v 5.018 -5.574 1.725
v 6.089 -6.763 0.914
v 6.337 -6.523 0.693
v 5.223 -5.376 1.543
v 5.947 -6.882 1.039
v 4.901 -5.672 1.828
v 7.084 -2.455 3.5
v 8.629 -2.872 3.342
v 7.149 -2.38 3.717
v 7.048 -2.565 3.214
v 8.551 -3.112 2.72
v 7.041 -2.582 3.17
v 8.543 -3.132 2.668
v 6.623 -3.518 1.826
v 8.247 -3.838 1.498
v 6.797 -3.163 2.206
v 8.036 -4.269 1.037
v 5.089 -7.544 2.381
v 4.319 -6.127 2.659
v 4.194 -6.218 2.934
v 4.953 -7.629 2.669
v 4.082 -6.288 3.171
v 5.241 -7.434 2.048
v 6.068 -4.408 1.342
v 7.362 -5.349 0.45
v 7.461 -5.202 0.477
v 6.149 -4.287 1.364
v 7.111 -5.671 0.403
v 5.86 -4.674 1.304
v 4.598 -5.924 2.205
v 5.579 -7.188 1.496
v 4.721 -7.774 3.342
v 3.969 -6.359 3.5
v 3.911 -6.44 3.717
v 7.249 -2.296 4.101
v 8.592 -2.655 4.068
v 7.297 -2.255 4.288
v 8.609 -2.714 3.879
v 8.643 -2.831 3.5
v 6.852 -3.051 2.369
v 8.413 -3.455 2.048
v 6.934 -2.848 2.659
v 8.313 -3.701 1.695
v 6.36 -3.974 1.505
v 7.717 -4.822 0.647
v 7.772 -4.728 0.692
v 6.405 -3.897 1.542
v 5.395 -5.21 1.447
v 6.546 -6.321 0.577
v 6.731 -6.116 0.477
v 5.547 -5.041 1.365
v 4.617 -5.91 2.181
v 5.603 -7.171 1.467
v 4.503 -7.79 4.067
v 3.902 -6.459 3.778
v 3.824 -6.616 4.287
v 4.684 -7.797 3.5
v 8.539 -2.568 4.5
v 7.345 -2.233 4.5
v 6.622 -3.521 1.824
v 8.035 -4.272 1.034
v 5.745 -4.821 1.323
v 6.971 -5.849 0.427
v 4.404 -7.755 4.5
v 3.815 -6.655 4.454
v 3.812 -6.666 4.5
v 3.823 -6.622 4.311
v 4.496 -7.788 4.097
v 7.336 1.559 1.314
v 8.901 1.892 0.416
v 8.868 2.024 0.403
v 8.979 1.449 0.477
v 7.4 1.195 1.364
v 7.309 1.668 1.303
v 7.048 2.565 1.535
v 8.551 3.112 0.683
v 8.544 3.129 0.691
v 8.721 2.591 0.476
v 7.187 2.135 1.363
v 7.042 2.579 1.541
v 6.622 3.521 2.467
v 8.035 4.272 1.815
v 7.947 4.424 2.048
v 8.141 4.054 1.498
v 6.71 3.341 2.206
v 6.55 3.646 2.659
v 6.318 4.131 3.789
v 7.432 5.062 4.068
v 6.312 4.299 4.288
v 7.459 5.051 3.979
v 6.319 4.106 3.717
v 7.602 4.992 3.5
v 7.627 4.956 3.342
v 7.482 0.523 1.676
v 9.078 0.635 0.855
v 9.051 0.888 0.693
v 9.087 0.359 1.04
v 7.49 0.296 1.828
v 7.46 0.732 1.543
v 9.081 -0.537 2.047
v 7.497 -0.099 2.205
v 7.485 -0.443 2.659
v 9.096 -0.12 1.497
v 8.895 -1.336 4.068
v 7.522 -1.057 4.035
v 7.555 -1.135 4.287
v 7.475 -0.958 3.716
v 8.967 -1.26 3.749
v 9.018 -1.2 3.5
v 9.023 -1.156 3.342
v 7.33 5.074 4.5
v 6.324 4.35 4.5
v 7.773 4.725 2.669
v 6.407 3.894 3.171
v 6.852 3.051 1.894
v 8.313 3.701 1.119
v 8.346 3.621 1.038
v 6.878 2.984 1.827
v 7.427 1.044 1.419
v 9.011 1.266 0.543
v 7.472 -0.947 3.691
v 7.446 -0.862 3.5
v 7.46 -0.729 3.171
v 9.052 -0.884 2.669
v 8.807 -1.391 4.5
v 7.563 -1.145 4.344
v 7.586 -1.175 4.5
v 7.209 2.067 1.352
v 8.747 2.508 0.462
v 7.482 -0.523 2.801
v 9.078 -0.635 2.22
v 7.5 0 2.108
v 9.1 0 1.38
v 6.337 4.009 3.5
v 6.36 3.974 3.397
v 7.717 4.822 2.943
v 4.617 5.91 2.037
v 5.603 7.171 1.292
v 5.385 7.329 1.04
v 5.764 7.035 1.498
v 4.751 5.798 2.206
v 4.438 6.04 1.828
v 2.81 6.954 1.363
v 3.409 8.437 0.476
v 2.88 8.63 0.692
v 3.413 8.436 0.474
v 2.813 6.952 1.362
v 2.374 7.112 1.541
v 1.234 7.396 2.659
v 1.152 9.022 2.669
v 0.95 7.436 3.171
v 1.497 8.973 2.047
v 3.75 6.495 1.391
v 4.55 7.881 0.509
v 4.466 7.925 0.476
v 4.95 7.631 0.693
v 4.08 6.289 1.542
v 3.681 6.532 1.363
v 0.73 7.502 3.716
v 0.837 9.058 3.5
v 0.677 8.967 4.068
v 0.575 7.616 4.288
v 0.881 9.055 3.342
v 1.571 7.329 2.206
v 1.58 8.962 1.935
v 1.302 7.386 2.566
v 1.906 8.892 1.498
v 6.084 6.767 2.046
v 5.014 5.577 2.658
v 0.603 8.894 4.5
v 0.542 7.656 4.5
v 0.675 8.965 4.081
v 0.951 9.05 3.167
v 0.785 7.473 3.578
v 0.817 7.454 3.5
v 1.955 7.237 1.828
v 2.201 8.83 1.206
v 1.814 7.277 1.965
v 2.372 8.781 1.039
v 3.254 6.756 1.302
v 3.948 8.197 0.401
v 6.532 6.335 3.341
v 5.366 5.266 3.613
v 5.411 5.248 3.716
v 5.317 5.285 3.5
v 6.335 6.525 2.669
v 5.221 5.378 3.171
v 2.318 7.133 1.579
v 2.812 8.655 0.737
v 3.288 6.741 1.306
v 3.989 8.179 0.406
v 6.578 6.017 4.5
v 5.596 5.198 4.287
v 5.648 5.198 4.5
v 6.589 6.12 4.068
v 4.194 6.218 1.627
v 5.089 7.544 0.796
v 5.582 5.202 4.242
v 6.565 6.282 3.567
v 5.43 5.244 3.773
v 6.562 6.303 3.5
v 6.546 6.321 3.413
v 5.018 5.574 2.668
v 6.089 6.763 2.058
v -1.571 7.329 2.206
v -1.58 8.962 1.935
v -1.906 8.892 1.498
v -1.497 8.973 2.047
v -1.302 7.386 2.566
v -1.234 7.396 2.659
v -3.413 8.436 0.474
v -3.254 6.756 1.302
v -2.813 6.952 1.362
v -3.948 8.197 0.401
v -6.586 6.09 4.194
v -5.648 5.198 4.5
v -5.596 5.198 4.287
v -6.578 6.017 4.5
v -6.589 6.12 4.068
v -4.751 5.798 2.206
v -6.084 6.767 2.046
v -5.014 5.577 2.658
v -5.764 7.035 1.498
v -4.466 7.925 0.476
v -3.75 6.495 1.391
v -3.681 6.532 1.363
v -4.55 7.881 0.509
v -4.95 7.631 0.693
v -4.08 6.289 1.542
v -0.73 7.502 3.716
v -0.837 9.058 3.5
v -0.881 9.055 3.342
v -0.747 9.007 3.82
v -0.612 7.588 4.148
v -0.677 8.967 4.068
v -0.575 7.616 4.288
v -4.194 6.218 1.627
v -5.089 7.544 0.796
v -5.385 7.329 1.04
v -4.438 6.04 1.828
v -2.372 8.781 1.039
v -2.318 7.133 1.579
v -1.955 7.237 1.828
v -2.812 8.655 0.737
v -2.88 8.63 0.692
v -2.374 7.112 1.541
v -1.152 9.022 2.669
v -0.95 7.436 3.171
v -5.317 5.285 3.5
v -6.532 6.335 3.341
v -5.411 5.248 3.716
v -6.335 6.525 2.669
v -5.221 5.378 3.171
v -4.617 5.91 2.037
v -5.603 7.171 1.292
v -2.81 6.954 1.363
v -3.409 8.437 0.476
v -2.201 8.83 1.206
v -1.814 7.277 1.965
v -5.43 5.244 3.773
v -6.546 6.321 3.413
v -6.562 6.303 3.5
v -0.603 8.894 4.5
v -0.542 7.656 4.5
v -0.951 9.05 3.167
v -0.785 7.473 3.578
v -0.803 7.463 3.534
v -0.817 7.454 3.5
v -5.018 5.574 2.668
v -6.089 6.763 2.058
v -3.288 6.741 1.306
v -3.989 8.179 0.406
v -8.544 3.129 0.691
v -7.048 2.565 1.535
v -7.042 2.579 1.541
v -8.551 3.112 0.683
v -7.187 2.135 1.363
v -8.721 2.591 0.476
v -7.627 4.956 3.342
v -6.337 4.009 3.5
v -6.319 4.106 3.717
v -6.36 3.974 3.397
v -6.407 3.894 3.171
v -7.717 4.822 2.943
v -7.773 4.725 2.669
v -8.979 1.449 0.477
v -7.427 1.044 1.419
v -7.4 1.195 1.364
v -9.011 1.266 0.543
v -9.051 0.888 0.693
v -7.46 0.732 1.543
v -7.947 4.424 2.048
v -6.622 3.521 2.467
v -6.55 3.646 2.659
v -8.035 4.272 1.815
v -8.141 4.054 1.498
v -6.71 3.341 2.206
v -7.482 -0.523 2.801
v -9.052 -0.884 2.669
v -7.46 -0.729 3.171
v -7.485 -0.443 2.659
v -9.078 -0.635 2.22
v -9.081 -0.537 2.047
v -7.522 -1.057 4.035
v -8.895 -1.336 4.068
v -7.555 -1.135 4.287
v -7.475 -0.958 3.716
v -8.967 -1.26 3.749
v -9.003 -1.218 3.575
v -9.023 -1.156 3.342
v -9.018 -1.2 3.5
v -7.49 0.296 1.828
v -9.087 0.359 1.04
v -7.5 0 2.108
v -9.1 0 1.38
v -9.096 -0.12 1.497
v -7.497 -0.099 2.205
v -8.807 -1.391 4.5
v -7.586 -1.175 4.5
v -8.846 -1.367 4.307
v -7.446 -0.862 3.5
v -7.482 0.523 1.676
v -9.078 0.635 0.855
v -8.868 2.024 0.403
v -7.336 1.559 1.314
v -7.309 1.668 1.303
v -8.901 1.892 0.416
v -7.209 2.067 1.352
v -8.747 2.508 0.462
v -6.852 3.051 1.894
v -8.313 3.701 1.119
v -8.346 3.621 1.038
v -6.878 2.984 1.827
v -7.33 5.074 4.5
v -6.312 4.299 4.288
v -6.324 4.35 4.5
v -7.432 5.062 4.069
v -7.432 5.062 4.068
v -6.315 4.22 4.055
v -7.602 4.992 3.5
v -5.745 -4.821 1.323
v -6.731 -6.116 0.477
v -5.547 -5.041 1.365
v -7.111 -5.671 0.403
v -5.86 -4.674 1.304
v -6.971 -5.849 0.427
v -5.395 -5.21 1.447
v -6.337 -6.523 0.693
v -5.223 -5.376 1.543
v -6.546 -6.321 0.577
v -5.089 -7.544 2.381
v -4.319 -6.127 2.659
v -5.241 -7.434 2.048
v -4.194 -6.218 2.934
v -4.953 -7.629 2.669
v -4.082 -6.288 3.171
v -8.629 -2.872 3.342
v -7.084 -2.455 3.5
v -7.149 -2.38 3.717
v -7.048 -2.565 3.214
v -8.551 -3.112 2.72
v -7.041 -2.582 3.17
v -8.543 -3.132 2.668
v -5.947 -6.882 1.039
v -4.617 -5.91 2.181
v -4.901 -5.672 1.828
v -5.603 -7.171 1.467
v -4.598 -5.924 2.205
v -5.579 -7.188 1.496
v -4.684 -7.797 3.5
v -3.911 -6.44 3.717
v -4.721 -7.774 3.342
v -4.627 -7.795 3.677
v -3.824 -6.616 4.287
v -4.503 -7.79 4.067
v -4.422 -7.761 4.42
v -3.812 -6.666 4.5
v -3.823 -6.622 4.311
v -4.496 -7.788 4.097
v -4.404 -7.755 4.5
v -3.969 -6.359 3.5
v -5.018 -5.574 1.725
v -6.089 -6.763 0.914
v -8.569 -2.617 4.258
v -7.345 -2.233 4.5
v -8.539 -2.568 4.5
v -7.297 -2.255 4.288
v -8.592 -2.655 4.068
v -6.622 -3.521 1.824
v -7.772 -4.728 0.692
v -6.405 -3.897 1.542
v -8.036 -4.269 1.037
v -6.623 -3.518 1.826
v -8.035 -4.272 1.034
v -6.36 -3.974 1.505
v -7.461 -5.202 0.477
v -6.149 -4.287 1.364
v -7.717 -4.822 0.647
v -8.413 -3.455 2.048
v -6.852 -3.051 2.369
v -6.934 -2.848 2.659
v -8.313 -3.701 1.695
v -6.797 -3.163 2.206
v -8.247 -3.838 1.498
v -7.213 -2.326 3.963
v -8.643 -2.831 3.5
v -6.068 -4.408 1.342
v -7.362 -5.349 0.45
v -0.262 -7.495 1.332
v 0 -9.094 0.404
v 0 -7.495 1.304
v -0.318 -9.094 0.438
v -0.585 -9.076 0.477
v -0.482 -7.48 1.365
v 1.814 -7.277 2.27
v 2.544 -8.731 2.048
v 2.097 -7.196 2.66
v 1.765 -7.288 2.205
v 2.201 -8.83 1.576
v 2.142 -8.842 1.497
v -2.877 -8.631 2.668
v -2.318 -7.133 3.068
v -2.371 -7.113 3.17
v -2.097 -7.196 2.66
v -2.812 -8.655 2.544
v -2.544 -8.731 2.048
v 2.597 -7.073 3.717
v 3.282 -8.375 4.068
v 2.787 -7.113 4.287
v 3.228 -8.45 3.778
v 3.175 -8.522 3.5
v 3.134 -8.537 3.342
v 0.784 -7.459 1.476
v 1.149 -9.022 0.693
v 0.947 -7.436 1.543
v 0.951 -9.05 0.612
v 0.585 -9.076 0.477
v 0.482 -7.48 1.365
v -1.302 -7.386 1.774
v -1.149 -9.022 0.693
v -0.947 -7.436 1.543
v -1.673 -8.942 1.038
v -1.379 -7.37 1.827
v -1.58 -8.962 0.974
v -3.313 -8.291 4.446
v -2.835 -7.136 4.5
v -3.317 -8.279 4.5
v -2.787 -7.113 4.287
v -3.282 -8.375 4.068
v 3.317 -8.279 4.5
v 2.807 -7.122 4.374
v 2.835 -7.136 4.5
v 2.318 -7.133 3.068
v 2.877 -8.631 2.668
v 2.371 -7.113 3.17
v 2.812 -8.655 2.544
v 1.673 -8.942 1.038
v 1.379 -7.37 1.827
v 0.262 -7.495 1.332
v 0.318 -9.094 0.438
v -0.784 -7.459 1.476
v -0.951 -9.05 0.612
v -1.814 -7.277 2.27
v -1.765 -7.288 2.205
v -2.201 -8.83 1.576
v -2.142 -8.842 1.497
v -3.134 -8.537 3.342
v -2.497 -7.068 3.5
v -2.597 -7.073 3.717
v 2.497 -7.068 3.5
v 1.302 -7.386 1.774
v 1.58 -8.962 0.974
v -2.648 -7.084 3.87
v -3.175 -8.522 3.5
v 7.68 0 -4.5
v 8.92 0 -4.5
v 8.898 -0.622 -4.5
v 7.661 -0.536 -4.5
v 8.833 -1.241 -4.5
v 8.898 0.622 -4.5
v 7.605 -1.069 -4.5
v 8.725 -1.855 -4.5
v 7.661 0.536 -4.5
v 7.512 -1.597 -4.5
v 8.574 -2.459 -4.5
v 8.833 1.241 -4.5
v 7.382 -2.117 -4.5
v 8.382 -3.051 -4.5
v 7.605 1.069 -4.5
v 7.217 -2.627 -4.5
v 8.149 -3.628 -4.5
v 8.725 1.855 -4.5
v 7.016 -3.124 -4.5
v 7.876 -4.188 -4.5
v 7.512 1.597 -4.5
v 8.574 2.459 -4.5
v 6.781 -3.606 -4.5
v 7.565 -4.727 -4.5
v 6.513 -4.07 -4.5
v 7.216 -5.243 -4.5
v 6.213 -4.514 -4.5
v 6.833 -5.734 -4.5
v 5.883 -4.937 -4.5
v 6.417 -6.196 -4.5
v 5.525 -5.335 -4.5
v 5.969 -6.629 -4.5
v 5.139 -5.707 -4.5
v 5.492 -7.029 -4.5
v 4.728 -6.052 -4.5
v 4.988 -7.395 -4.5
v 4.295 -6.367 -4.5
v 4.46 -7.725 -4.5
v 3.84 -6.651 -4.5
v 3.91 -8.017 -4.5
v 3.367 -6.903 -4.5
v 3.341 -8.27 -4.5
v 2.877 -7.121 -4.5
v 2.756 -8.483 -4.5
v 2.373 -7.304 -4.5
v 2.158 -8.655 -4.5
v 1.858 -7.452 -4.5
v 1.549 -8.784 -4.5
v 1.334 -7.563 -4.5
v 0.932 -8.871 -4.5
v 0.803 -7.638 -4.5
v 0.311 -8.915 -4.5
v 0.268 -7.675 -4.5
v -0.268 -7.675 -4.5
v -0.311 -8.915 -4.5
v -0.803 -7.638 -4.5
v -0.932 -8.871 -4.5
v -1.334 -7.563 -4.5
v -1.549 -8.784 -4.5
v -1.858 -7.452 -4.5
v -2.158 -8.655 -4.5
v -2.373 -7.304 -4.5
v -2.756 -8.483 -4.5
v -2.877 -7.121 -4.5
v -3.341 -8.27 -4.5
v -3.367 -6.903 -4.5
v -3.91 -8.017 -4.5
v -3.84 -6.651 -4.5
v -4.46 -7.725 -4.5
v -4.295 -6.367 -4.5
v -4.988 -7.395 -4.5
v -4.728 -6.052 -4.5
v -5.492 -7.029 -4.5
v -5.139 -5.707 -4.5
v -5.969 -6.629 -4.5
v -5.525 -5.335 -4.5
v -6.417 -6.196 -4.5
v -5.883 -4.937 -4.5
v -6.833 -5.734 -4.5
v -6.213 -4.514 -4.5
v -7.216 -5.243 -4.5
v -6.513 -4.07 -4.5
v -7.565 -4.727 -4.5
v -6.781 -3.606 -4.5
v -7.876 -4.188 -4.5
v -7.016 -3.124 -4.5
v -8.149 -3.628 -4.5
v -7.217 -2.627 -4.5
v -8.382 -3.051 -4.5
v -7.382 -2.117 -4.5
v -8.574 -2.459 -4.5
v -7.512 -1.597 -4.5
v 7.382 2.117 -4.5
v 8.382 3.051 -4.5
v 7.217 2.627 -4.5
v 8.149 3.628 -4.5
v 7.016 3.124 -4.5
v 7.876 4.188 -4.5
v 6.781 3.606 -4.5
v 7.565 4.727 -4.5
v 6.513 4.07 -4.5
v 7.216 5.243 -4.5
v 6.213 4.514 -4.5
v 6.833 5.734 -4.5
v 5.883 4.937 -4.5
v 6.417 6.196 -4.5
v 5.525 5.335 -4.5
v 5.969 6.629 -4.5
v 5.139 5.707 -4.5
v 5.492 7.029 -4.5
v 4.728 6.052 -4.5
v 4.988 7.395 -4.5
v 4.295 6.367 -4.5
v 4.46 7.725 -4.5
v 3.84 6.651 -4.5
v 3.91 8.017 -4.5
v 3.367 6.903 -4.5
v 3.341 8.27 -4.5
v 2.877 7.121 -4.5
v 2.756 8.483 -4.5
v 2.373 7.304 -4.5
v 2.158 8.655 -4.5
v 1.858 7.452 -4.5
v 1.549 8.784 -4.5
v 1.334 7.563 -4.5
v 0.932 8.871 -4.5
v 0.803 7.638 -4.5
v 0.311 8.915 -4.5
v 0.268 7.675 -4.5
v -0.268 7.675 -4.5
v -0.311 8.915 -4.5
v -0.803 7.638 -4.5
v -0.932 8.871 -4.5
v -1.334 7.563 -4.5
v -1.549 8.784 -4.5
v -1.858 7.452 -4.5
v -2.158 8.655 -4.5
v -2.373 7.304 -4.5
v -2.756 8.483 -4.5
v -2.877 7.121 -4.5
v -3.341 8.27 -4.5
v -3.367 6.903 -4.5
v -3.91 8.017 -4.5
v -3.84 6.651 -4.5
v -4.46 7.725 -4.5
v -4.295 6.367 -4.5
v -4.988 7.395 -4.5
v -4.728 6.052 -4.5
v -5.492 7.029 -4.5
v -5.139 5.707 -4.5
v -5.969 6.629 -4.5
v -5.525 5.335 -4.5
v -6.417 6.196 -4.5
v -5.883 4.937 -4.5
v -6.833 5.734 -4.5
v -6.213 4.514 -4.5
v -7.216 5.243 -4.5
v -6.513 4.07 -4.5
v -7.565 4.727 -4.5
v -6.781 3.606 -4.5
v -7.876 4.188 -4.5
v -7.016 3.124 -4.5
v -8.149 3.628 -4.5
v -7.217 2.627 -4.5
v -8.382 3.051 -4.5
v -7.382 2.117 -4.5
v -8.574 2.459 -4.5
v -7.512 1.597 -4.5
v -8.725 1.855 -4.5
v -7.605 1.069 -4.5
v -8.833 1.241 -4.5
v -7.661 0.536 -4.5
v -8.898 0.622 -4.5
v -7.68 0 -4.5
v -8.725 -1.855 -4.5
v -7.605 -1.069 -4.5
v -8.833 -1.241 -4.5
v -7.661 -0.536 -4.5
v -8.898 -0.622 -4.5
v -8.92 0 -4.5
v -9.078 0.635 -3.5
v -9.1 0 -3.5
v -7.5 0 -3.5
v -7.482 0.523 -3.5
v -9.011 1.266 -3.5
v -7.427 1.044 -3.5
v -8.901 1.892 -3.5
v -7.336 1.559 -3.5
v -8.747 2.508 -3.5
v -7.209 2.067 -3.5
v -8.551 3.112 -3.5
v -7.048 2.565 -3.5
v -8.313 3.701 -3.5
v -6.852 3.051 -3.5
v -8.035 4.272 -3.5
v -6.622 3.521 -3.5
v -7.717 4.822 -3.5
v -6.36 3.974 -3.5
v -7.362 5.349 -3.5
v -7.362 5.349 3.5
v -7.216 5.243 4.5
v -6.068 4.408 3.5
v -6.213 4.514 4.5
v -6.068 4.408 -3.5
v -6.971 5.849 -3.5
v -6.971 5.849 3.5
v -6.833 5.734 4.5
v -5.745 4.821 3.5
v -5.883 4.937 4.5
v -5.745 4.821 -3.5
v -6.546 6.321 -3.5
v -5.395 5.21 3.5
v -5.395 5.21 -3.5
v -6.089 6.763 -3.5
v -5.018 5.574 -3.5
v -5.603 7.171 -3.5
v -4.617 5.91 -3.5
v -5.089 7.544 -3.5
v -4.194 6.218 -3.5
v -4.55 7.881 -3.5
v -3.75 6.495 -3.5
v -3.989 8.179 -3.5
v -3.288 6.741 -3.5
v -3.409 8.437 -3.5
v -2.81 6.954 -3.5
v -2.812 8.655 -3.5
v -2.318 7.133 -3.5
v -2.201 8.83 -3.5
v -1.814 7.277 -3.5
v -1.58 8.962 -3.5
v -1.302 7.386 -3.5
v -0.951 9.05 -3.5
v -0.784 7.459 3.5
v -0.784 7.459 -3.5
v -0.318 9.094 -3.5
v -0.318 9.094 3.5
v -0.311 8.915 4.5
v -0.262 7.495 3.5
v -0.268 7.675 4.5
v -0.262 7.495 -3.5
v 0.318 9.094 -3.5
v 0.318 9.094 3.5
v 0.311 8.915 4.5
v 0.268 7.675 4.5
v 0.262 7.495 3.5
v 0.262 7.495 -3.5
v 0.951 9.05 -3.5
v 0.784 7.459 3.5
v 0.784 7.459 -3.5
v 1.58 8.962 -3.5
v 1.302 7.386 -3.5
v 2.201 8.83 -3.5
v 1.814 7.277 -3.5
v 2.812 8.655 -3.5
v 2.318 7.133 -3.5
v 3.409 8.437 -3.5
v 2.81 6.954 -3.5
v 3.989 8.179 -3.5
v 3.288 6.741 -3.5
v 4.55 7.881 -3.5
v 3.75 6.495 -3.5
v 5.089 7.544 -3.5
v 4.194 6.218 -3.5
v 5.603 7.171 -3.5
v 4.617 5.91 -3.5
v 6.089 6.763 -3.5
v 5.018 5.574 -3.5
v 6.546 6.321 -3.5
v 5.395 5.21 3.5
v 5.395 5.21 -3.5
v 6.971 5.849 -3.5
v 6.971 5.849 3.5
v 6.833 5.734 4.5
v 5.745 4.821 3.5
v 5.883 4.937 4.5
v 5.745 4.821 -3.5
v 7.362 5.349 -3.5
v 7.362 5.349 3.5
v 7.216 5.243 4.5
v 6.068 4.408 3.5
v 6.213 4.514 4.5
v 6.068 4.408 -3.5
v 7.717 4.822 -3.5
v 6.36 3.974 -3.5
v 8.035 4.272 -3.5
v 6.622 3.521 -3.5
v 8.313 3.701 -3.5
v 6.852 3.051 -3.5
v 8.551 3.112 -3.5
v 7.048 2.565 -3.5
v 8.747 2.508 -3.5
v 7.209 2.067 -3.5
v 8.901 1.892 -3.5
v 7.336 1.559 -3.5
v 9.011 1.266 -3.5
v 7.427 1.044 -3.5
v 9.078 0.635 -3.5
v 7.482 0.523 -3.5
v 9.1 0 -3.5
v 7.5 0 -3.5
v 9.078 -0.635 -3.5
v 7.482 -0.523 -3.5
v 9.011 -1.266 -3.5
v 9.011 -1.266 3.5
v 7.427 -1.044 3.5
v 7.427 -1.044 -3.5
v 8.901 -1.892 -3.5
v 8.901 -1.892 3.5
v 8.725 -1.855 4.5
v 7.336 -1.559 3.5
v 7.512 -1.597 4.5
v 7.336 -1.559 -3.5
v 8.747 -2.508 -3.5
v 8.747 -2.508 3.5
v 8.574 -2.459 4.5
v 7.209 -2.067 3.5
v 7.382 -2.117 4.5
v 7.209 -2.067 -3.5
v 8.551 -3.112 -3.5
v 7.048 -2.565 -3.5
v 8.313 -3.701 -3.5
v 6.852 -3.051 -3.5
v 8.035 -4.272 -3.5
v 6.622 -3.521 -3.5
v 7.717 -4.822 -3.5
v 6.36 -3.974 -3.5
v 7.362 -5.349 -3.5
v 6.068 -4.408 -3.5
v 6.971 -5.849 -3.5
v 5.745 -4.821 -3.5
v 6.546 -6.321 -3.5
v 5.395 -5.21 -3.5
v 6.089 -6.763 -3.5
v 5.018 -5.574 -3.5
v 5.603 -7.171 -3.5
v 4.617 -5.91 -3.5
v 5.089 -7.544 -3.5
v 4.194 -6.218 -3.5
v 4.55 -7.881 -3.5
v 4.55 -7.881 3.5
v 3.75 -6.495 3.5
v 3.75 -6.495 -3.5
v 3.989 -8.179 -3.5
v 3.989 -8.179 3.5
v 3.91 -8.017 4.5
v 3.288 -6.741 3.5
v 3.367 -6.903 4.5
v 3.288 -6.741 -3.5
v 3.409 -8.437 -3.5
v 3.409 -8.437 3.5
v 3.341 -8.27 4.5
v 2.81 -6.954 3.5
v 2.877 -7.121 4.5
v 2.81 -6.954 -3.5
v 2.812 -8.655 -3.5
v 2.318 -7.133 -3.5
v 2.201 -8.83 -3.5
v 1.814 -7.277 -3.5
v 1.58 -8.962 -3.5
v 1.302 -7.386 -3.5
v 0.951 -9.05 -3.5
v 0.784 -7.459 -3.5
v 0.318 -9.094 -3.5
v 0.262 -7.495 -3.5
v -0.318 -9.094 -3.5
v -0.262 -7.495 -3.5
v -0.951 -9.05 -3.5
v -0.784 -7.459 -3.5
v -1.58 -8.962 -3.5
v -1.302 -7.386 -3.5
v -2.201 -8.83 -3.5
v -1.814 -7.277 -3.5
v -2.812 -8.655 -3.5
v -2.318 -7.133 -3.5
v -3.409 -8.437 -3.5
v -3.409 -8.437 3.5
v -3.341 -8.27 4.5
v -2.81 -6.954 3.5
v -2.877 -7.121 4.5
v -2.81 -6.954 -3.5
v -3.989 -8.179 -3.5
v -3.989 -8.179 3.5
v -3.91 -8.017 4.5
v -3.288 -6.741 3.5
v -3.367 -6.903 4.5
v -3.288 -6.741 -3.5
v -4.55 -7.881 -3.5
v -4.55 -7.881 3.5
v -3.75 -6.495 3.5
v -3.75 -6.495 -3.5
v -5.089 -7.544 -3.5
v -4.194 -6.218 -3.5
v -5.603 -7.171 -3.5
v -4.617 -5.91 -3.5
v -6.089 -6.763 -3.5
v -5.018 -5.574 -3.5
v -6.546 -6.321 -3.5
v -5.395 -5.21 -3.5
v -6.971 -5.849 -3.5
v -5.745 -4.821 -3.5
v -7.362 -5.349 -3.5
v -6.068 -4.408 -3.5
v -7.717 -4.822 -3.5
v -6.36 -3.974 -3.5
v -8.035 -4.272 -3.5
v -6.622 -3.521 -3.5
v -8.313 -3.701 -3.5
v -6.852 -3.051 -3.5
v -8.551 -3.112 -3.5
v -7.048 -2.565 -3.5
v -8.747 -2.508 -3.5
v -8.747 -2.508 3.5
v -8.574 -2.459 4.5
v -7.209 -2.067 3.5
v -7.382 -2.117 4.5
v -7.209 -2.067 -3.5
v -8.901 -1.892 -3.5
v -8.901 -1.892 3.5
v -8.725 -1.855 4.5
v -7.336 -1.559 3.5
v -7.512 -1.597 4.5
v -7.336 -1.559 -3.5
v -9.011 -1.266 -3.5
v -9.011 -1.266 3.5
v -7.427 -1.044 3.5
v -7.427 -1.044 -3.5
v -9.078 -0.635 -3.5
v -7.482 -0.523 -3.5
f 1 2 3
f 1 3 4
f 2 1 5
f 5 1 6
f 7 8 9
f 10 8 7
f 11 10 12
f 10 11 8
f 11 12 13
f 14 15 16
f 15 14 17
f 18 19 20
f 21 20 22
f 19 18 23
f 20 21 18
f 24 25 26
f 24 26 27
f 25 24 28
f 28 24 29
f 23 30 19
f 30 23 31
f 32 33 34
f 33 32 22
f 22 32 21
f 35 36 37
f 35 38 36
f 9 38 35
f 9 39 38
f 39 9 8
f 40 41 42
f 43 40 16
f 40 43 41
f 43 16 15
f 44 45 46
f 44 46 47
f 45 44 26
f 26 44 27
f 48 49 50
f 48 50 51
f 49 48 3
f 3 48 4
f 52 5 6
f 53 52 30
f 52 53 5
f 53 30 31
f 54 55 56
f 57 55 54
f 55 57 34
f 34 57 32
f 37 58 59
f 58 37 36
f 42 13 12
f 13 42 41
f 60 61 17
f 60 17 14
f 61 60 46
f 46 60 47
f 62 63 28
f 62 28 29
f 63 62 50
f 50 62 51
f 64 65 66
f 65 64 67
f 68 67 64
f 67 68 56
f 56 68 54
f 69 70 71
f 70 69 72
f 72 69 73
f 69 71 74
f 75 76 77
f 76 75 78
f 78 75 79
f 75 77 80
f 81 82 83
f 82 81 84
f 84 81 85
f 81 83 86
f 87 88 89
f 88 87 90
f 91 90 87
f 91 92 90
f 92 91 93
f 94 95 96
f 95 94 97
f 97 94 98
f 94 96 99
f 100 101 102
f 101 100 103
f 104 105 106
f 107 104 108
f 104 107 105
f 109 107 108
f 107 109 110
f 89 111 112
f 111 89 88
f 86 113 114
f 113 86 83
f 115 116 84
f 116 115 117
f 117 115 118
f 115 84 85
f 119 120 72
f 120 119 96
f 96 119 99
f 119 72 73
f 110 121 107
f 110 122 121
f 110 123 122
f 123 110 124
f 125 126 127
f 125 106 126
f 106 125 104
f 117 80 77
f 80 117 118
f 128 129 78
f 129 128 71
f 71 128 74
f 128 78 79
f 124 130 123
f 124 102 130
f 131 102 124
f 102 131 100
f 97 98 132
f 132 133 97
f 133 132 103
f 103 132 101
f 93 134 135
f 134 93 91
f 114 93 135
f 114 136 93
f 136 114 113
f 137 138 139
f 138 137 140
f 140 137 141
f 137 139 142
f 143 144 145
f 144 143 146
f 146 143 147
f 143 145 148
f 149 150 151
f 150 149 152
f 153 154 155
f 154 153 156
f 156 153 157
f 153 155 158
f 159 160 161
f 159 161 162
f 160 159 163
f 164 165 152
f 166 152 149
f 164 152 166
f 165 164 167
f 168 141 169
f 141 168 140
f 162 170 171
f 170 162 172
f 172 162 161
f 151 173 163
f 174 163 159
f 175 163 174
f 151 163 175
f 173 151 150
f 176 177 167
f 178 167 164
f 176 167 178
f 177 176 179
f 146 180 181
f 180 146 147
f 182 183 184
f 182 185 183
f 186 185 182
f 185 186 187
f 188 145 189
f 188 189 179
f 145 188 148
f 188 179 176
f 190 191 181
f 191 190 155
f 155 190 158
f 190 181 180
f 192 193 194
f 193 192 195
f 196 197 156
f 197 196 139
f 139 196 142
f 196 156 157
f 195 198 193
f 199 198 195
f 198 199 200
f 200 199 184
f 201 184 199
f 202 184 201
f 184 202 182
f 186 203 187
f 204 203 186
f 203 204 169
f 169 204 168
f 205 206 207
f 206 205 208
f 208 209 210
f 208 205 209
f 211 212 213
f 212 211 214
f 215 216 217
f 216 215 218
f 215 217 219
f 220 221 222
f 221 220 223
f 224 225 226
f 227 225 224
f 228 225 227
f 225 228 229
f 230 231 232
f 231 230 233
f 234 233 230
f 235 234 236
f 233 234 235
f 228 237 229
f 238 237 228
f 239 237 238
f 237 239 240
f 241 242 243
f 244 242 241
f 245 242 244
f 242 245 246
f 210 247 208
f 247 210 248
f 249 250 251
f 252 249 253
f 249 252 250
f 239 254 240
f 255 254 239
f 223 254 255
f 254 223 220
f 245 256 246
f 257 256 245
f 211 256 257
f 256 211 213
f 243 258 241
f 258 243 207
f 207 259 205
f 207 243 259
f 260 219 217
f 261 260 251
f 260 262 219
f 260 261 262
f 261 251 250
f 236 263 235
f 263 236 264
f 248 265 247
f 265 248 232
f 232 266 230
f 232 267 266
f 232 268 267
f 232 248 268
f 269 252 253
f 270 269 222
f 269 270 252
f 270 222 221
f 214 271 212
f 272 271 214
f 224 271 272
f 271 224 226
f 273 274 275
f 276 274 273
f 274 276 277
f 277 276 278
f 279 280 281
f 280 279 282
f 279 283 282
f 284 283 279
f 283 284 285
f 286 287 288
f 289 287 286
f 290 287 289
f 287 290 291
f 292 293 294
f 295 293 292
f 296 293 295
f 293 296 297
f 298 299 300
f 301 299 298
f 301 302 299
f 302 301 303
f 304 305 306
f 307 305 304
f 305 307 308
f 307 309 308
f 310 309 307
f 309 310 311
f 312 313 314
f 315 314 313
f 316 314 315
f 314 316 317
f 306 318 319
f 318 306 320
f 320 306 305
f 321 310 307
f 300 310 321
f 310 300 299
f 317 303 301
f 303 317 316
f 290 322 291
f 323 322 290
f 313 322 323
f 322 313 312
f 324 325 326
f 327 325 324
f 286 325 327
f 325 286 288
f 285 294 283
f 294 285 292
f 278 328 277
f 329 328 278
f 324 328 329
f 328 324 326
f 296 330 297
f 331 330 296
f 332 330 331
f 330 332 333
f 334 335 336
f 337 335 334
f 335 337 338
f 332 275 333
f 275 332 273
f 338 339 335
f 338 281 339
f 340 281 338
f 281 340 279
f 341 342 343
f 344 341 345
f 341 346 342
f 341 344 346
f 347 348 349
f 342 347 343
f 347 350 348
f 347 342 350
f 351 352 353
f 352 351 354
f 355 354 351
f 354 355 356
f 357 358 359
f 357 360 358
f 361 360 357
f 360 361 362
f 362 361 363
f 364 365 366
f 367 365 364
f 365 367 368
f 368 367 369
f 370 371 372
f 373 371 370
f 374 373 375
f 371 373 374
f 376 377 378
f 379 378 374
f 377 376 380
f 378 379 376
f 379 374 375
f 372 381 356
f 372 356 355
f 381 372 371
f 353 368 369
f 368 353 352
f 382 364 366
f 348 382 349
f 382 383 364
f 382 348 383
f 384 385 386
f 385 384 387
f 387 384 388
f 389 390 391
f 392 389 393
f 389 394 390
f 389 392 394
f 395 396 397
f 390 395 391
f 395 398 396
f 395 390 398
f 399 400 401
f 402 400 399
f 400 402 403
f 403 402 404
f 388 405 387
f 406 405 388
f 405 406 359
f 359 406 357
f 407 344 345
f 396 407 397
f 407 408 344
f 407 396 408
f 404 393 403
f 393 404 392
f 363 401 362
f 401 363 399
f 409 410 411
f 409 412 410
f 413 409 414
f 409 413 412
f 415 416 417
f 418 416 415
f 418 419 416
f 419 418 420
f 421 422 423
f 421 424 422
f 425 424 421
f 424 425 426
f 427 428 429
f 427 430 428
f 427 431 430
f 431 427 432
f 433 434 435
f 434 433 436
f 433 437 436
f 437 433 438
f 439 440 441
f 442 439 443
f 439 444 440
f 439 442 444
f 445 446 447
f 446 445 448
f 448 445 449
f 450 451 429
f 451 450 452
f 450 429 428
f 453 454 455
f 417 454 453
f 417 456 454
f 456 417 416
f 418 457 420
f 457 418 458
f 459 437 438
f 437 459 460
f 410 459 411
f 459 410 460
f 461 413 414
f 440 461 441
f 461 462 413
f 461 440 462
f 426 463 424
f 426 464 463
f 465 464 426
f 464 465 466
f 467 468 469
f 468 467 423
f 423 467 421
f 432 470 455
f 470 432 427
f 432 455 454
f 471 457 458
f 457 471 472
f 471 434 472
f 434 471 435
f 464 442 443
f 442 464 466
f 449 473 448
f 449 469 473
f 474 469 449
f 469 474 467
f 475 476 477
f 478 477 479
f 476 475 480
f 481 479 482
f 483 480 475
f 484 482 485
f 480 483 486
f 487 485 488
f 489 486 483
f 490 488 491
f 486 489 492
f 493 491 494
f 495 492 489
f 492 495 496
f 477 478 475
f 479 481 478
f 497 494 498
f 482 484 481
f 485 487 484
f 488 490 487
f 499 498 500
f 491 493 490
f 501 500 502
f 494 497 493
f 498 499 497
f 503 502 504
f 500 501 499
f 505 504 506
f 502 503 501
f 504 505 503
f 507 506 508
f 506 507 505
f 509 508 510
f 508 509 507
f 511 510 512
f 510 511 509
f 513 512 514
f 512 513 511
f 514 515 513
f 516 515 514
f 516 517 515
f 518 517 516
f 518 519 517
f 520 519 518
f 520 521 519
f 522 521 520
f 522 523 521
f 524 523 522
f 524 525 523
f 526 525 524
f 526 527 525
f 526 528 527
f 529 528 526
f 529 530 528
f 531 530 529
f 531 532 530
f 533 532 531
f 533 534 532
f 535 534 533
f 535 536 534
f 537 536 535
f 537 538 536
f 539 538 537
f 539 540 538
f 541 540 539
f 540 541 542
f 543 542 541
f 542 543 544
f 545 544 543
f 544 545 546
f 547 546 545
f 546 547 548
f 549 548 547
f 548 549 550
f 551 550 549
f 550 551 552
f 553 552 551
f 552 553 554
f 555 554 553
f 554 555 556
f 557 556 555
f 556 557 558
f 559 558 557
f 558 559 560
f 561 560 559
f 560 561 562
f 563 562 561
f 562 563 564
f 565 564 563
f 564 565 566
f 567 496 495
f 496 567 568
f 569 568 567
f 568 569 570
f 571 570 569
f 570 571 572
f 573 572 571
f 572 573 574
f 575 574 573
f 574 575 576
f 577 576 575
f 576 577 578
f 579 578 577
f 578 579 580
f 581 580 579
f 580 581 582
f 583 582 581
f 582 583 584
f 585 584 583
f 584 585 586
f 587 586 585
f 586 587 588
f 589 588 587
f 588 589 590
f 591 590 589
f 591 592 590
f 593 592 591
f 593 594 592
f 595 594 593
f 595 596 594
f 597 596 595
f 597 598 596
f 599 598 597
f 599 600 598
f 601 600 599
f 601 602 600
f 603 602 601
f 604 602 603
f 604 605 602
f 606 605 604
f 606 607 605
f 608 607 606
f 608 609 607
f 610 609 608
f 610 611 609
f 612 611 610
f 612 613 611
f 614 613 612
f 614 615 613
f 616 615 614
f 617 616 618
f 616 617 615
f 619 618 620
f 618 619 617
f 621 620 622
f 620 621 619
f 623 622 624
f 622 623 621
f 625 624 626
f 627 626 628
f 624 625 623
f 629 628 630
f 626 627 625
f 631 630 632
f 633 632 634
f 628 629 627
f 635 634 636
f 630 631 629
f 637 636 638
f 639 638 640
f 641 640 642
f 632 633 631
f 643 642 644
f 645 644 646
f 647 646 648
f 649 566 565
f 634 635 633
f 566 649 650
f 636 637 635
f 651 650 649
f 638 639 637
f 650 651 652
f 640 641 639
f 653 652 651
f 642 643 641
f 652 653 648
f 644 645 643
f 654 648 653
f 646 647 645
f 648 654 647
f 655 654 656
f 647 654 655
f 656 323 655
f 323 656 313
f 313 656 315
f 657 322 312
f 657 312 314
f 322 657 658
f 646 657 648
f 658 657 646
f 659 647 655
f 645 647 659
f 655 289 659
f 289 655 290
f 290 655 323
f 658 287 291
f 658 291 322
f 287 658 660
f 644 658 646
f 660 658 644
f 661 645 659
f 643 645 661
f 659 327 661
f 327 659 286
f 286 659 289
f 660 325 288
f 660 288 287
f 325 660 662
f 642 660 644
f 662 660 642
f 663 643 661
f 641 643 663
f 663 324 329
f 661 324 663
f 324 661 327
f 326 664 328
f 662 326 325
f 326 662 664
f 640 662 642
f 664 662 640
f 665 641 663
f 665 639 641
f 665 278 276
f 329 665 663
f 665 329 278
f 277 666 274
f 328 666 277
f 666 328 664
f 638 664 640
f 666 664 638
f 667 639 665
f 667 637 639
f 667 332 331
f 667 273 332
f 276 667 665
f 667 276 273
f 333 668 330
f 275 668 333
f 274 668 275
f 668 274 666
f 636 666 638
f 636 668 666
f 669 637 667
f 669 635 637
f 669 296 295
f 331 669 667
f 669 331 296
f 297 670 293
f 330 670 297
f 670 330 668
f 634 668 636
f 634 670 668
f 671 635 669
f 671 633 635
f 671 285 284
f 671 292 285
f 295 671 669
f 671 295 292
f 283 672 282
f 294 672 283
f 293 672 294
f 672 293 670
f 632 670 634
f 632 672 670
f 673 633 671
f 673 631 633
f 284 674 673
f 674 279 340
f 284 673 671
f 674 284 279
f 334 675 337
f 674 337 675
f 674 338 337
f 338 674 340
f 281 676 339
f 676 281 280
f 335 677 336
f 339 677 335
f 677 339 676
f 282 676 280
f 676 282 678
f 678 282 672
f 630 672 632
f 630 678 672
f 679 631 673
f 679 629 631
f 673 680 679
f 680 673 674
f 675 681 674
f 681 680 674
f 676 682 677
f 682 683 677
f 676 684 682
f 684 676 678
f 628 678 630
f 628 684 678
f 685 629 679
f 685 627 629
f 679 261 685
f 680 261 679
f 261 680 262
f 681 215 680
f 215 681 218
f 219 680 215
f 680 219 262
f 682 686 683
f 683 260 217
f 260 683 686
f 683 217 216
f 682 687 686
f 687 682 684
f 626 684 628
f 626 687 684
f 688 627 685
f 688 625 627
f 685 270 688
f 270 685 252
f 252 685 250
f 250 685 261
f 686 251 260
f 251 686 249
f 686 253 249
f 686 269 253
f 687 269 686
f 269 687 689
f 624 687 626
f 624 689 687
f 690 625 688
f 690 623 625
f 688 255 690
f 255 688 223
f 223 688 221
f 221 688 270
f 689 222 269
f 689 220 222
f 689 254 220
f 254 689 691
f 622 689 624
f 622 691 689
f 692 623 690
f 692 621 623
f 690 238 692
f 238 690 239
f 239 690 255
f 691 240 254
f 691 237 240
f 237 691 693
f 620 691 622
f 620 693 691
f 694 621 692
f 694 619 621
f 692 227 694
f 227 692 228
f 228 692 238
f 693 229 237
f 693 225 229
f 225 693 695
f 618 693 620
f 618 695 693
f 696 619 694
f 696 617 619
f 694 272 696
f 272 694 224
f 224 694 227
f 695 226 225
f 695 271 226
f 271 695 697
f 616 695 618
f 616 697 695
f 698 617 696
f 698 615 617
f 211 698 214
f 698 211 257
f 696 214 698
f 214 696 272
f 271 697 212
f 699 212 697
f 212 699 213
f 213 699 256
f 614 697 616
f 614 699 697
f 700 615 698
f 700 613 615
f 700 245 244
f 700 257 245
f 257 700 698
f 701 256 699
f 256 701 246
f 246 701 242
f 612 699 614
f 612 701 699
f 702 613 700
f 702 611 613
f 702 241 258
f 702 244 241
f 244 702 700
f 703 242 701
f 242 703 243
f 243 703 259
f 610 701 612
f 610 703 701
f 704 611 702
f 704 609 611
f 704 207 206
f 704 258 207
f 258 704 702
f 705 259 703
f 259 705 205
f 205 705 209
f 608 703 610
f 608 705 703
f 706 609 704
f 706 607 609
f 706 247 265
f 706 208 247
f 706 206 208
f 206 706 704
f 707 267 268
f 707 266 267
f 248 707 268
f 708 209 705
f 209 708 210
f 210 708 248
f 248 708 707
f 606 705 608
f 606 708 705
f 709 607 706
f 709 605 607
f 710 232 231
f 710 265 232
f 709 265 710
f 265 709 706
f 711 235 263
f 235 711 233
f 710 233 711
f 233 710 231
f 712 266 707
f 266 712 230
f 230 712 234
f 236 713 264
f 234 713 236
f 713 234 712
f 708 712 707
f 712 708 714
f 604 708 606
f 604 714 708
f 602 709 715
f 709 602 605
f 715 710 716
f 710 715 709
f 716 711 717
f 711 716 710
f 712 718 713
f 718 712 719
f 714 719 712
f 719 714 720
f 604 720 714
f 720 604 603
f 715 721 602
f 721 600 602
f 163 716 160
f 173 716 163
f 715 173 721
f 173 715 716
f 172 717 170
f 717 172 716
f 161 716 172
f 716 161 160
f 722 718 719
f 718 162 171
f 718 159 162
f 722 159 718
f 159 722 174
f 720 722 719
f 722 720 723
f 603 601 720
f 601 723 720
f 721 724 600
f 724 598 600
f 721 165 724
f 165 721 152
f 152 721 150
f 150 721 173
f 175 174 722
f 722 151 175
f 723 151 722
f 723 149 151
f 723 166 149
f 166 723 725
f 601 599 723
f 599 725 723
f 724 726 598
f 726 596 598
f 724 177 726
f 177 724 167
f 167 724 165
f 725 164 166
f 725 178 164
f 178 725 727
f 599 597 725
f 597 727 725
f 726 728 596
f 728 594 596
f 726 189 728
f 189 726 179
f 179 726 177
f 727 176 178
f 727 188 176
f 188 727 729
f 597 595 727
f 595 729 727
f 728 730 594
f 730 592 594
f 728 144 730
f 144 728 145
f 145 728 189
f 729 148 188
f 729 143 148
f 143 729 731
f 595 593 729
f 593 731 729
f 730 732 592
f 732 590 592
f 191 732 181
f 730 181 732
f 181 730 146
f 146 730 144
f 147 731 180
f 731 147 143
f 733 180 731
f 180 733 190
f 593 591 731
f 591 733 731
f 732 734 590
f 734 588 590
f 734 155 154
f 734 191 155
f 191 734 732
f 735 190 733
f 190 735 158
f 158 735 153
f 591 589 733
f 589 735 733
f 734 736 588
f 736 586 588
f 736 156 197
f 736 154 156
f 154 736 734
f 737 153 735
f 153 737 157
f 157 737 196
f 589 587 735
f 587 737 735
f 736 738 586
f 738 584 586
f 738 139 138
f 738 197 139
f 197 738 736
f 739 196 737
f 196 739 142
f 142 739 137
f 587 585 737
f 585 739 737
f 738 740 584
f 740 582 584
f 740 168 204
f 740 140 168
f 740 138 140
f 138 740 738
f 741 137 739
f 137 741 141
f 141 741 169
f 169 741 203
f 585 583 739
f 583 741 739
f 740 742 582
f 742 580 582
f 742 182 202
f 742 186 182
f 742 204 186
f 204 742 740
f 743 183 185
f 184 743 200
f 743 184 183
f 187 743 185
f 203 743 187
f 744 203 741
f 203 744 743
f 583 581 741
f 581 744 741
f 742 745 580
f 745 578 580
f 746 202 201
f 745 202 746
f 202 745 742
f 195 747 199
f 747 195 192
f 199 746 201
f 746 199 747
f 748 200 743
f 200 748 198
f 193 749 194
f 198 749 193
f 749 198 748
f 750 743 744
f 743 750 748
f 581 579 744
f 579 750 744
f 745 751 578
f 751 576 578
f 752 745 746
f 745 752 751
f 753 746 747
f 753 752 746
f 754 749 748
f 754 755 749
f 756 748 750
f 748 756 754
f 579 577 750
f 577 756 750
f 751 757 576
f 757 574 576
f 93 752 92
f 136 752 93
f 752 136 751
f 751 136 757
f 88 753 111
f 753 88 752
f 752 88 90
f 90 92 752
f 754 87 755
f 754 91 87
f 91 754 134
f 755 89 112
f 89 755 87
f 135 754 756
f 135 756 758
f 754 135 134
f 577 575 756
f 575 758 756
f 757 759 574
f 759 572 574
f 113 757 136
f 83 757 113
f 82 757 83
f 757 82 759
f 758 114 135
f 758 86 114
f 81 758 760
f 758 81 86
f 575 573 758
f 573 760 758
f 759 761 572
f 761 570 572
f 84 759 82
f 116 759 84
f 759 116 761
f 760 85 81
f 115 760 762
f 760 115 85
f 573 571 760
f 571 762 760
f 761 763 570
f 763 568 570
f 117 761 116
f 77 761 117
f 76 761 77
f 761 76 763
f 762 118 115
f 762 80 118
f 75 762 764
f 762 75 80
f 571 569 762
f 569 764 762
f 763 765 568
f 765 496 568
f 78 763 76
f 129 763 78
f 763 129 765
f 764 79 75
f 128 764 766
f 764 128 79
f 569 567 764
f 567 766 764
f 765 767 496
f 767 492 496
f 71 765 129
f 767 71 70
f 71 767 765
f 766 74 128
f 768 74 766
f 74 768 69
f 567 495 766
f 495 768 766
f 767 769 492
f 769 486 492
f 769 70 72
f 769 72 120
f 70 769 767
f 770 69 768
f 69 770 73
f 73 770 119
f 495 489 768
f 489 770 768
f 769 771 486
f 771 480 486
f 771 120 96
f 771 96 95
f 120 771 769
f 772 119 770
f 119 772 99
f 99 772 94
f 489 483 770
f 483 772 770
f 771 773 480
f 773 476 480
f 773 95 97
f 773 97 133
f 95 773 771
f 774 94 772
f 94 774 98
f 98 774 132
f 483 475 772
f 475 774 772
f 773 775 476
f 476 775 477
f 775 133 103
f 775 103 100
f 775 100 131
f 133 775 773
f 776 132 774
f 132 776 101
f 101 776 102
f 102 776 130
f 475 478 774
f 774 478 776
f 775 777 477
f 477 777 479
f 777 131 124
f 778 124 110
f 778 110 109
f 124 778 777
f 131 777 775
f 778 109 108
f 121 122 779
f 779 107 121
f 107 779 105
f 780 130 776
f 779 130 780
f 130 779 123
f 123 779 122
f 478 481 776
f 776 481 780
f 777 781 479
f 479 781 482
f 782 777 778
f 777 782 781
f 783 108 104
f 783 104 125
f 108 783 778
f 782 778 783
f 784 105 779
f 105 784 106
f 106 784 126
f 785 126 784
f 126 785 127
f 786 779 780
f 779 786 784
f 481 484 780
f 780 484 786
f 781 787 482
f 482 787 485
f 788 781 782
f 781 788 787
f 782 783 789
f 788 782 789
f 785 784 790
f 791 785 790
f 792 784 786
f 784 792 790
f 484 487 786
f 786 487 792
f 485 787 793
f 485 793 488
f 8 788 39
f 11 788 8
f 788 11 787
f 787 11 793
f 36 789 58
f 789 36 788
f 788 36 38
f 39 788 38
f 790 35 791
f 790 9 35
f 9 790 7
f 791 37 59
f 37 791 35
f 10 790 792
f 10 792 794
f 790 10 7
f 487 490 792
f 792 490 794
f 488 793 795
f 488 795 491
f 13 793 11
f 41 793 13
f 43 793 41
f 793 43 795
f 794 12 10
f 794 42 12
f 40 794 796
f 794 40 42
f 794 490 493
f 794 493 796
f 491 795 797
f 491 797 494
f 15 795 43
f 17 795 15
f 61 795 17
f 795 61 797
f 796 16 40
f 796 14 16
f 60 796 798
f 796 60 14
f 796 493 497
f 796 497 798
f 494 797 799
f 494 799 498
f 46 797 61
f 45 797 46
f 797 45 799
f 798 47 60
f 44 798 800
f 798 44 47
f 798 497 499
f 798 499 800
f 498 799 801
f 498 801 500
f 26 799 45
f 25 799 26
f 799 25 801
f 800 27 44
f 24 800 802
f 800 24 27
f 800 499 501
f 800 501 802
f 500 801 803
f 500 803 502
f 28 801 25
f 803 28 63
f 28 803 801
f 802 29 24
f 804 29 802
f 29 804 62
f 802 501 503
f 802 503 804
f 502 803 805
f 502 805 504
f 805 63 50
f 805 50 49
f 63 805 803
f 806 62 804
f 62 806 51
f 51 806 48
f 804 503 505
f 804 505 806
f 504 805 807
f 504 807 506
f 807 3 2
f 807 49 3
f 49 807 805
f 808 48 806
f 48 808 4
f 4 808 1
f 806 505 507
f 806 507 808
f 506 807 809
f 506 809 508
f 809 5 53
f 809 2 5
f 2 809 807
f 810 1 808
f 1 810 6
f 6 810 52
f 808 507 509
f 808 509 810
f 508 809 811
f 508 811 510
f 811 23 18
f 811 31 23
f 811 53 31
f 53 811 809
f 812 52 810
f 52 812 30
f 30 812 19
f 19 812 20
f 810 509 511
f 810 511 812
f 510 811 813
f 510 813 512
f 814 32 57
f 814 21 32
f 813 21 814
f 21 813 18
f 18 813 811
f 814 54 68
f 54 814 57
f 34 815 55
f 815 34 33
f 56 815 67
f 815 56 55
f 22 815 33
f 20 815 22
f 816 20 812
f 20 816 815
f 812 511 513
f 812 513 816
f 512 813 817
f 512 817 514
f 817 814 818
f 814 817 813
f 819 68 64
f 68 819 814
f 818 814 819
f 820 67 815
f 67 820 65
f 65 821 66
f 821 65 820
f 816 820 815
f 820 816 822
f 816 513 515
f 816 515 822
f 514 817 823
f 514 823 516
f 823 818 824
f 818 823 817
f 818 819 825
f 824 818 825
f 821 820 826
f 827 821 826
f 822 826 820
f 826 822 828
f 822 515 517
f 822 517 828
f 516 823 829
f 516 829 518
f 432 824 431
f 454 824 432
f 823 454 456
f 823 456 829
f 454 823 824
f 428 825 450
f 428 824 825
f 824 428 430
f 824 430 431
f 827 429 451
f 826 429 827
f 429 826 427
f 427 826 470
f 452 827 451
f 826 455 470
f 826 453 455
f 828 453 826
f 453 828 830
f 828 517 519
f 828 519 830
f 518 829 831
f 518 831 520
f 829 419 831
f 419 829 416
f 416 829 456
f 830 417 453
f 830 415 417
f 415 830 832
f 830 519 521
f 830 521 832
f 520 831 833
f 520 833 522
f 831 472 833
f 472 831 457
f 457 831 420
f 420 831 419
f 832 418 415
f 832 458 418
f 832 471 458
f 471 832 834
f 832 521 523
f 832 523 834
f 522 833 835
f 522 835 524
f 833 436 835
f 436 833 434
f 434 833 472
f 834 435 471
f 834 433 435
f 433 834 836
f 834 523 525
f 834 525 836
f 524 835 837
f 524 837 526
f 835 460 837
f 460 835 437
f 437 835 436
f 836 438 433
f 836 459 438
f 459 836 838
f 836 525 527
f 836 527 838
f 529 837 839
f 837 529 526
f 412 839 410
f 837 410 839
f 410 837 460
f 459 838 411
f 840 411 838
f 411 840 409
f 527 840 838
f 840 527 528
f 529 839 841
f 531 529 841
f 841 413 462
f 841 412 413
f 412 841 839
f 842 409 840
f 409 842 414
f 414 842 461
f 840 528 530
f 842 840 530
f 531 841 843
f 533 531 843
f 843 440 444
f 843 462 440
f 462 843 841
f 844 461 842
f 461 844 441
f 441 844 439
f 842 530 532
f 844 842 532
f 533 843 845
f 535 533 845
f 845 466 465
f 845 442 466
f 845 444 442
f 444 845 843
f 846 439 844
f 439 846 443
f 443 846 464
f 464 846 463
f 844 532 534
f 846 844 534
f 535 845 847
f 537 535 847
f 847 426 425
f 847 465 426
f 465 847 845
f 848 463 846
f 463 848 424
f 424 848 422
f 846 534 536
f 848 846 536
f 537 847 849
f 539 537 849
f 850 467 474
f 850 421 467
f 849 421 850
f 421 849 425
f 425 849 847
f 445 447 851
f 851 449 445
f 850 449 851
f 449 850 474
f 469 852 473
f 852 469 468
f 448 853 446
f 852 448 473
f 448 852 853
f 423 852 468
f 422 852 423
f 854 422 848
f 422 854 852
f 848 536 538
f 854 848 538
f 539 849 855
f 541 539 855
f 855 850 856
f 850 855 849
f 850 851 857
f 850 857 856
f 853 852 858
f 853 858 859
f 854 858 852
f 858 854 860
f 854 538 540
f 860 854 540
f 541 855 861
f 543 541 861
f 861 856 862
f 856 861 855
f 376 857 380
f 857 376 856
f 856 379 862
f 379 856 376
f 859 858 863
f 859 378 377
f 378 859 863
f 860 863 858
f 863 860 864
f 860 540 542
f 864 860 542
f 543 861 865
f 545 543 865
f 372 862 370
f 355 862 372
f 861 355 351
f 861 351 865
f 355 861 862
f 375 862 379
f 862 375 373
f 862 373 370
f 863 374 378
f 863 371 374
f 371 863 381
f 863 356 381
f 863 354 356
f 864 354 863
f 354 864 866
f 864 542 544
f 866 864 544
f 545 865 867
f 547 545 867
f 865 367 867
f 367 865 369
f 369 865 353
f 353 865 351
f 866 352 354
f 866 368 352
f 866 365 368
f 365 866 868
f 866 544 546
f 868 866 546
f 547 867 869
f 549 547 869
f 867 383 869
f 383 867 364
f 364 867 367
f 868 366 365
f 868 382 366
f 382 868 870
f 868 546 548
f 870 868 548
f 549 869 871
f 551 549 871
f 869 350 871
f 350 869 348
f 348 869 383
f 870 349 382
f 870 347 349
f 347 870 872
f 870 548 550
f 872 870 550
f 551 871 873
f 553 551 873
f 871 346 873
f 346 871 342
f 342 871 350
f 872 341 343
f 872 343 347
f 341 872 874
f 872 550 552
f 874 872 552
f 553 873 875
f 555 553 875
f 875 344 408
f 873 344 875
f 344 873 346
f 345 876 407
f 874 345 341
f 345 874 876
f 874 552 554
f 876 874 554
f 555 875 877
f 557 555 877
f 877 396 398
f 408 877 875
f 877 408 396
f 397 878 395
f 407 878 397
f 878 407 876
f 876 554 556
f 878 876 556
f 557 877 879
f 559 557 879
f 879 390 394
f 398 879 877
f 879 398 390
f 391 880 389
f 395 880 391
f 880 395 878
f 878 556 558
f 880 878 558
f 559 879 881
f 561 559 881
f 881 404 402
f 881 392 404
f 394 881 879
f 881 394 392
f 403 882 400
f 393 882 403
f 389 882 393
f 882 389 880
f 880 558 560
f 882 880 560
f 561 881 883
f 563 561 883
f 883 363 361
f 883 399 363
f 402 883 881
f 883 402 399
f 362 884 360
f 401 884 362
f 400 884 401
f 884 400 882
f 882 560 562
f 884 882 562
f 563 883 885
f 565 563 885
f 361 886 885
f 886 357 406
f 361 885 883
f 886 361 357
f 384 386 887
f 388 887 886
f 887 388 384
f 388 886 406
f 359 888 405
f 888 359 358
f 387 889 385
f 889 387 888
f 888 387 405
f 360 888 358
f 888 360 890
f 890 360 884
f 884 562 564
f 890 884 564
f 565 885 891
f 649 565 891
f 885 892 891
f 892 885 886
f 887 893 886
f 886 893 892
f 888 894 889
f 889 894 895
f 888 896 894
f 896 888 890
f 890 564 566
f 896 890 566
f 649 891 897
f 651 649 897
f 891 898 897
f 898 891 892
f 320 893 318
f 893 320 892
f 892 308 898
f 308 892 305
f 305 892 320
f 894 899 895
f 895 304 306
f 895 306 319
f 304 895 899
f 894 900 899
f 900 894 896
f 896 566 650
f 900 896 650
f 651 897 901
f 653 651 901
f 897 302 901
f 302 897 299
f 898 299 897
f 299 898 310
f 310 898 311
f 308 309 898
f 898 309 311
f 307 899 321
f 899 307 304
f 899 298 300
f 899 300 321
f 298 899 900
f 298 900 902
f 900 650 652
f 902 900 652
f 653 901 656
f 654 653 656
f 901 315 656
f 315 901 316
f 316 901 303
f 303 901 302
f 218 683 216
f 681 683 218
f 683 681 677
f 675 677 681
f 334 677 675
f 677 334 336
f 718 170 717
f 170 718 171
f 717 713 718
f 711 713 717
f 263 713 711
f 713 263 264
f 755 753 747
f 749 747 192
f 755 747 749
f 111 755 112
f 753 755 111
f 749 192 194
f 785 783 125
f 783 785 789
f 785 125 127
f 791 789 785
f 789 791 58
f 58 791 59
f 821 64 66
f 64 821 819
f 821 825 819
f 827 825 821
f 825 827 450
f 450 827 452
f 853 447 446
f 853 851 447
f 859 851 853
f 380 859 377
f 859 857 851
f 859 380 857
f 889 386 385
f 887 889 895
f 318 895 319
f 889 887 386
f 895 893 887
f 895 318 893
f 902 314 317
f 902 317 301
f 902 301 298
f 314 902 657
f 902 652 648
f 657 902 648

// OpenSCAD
eps = 0.001;
thickness = 1.6;
width = 9;

sizer_steps = 10;
sizer_step_size = 0.5;

module sizer_distribution(min_id) {

  for (i = [0:sizer_steps-1]) {
    $id = min_id + i*sizer_step_size;
    x = i*(min_id + thickness-0.2) + i*i*sizer_step_size/2;
    translate([x, 0])
      children();
  }
}

module sizer_2d(min_id) {
  $fn=90;

  difference() {
    hull()
      sizer_distribution(min_id)
        circle(d=$id+thickness*2);
    
    sizer_distribution(min_id)
      circle(d=$id);
  }
}

module sizer(min_id) {
  linear_extrude(width)
    sizer_2d(min_id);
  
  color("red")
    translate([36, min_id/2+thickness-eps, width*0.15])
      rotate([90, 0, 180])
        linear_extrude(1.5)
          offset(0.2, $fn=60)
            text(str(min_id + (sizer_steps-1)*sizer_step_size, " — ", min_id), size=width*0.7);
}

module ring_blank_2d(id) {
  bevel = 0.18;
  
  for (a = [-1, 1]) {
    scale([1, a]) {
      hull() {
        translate([id/2, 0])
          square([thickness, width/2-1]);
        translate([id/2+bevel, 0])
          square([thickness-2*bevel, width/2]);
      }
    }
  }
}

module ring_blank(id) {
  rotate_extrude($fn=90)
    ring_blank_2d(id);
}

module crown_cutouts(id) {
  $fn = 40;
  
  breadth = id*0.5;
  depth = 8 + id*0.15;
  count = 7;
  
  for (a = [1:count])
    rotate([0, 0, a*360/count])
      translate([0, 0, width/2+depth*0.1])
        scale([breadth, 1, depth])
          rotate([90, 0, 0])
            cylinder(d1=0, d2=1, h=id/2+thickness+eps);
}

module crown_ring(id) {
  difference() {
    ring_blank(id);
    crown_cutouts(id);
  }
}

module sizers() {
  sizer(12);
  translate([170, -22])
    rotate([0, 0, 180])
      sizer(17);
}

crown_ring(15);
